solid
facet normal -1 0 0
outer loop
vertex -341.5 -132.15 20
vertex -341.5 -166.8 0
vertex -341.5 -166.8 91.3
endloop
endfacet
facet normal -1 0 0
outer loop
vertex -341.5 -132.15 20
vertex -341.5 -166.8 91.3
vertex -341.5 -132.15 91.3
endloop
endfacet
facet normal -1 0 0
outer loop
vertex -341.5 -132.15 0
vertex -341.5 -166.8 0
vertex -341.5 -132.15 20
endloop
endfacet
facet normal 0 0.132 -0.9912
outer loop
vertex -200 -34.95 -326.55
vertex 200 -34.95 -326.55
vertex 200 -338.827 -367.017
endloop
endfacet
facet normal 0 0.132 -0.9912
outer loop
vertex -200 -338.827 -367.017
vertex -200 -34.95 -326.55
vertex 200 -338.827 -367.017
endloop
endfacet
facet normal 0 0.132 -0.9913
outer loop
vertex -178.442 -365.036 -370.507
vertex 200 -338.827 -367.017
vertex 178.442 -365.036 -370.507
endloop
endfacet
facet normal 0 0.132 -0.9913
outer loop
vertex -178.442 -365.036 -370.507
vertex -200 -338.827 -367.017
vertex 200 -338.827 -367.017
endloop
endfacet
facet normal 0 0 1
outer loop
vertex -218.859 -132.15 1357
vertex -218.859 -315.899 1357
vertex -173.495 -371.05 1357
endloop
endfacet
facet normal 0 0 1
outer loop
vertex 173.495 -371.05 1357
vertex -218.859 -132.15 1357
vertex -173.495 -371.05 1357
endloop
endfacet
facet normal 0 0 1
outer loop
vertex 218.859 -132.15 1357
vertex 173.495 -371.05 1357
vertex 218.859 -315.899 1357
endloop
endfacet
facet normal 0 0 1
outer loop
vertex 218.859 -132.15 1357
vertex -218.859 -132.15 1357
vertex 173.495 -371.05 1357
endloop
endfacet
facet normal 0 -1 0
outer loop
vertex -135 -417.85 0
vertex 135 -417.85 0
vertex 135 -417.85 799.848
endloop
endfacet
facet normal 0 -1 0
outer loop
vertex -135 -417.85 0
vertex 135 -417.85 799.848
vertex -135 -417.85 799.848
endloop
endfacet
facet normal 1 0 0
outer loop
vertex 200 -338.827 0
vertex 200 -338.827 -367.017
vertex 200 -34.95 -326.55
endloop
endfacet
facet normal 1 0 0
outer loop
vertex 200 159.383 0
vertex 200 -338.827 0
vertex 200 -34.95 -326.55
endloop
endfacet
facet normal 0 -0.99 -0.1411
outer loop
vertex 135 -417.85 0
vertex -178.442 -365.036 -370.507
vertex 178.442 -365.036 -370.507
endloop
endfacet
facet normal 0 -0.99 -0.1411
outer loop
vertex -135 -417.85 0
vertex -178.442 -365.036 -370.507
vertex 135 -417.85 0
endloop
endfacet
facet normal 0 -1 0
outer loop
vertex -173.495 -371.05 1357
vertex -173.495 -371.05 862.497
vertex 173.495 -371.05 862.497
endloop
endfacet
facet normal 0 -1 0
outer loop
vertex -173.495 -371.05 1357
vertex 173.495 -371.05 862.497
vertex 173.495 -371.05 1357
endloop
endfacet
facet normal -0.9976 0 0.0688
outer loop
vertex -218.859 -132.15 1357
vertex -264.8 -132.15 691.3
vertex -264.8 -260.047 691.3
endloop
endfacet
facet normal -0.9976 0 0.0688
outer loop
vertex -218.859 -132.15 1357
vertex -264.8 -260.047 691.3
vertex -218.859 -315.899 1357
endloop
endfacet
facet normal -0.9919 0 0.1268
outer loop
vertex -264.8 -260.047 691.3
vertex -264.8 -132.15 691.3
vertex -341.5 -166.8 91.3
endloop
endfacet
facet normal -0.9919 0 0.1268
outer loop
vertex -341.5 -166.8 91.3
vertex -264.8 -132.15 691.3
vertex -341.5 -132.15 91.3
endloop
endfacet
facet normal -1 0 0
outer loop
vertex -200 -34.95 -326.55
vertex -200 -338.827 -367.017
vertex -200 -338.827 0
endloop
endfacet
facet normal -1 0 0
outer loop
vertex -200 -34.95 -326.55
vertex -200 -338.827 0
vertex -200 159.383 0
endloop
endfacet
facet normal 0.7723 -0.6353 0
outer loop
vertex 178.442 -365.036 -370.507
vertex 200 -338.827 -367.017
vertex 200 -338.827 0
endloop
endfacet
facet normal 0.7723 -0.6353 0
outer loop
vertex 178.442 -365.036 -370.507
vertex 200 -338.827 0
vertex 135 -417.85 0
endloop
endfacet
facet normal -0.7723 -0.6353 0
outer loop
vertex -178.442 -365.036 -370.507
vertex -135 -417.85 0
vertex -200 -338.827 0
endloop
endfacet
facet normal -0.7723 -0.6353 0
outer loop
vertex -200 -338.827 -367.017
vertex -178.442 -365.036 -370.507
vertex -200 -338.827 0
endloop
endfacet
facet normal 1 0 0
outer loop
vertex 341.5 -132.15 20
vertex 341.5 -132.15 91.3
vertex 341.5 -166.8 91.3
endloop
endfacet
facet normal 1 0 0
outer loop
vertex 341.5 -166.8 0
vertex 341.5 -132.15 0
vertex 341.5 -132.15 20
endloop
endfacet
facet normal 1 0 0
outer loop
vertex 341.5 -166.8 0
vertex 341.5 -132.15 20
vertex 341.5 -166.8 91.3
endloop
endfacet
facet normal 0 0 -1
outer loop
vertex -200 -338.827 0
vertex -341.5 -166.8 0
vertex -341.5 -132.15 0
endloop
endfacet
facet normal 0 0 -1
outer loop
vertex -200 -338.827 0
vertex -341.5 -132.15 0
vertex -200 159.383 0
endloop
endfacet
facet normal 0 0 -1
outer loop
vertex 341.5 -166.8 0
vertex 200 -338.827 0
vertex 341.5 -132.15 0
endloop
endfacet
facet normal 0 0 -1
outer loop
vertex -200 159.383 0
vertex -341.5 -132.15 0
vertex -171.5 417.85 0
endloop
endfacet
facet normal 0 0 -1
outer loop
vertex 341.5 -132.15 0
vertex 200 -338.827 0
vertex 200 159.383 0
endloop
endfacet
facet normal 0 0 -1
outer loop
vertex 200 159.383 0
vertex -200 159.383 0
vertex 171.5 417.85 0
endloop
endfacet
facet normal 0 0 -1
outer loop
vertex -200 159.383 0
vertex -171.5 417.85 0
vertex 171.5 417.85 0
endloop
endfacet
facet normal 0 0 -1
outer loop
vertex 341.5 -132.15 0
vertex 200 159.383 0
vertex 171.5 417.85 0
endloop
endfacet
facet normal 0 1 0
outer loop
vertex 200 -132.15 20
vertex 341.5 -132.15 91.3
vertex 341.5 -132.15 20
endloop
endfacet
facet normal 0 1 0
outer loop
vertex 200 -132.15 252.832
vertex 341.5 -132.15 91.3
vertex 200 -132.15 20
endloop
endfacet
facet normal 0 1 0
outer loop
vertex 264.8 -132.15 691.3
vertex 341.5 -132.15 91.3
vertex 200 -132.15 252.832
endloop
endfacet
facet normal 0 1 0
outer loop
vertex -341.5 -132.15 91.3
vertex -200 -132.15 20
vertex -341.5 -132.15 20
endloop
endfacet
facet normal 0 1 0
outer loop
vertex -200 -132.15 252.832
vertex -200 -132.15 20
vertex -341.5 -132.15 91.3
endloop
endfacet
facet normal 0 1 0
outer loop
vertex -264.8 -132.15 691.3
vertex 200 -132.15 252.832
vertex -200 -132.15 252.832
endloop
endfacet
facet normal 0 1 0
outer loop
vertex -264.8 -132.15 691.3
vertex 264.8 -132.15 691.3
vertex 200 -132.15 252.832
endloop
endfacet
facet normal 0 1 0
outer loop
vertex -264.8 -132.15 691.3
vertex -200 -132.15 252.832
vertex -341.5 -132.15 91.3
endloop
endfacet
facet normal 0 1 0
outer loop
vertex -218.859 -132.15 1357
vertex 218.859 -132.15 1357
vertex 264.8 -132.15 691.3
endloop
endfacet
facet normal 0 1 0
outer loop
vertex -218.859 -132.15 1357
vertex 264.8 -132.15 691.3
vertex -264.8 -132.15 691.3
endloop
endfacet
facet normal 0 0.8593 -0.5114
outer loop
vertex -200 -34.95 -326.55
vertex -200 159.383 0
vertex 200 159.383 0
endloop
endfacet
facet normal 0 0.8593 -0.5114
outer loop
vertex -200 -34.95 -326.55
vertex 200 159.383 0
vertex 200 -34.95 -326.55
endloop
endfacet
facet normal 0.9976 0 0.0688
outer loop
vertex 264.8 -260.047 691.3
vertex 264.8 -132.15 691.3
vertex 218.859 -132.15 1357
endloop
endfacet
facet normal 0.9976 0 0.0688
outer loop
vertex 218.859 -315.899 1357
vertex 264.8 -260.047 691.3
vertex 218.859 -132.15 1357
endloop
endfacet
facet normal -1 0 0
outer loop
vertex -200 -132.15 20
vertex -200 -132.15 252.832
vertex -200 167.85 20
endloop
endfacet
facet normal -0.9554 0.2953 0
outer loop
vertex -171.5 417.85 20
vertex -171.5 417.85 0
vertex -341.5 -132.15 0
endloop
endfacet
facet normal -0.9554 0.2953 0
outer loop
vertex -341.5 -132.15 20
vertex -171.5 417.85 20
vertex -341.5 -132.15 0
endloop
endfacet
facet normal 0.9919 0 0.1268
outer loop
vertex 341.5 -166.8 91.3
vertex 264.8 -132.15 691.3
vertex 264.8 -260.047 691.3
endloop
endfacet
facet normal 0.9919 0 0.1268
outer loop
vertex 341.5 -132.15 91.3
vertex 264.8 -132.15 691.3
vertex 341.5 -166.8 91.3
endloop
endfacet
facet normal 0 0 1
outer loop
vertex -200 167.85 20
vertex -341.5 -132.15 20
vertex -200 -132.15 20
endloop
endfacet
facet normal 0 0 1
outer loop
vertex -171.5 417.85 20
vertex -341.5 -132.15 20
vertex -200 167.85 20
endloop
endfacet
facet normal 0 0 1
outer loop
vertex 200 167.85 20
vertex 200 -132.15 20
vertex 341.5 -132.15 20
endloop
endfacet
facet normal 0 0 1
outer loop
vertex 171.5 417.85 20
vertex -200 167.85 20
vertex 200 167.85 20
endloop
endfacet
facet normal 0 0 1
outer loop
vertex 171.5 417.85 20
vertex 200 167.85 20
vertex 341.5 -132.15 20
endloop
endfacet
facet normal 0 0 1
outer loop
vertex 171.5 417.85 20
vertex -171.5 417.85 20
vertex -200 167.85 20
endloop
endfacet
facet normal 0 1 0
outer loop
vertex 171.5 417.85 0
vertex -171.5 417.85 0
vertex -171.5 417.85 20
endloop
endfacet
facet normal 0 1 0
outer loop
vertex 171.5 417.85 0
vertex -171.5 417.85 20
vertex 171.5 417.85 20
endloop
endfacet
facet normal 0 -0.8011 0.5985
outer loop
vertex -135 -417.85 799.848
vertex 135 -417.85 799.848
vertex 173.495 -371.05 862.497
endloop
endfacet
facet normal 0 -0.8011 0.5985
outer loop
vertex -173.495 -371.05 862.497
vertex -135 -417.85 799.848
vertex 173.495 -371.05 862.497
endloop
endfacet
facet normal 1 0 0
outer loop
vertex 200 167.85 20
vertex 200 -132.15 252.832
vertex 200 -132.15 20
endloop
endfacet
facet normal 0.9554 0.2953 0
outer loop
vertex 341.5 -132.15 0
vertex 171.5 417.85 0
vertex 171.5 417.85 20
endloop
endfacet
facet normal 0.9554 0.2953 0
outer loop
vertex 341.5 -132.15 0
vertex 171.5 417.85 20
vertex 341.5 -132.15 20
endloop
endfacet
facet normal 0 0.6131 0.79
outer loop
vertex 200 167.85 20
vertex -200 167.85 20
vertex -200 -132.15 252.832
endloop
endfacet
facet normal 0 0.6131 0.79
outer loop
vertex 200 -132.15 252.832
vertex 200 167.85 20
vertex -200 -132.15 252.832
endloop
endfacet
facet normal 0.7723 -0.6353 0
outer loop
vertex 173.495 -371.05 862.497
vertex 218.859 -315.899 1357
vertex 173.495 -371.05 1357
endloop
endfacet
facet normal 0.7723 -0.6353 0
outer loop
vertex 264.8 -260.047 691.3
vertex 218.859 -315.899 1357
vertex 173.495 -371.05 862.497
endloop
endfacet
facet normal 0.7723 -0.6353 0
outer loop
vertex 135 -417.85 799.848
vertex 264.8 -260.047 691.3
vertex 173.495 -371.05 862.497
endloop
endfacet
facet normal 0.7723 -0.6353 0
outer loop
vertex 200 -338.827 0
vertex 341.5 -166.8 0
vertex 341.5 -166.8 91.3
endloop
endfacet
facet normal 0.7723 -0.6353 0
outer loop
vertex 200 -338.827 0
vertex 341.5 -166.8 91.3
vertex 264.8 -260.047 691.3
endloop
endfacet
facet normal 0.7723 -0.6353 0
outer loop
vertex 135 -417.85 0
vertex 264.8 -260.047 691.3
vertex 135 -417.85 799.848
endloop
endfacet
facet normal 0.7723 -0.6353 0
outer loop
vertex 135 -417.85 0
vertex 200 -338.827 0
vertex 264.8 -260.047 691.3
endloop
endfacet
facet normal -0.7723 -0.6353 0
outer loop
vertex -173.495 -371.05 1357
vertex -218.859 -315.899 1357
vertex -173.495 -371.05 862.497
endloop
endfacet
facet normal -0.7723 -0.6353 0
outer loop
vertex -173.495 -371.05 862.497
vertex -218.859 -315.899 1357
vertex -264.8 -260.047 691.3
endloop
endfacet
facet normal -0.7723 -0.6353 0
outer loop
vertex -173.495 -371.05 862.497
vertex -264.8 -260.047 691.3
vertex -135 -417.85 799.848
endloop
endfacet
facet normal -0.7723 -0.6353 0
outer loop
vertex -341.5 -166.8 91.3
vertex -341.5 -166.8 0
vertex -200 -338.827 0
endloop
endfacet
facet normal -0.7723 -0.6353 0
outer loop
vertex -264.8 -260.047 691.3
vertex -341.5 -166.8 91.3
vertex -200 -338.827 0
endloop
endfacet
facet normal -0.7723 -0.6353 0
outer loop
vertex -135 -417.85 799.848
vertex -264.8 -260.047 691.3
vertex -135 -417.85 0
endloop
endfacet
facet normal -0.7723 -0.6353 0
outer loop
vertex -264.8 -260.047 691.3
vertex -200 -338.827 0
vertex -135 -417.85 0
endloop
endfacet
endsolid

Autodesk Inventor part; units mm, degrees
ref_plane "YZ Plane" through (0, 0, 0) normal (1, 0, 0) x (0, 1, 0)
ref_plane "XZ Plane" through (0, 0, 0) normal (0, 1, 0) x (-1, 0, 0)
ref_plane "XY Plane" through (0, 0, 0) normal (0, 0, 1) x (1, 0, 0)
sketch "スケッチ1" plane through (0, 0, 0) normal (0, 0, 1) x (1, 0, 0)
  line L0 (-341.5, 417.85) -> (341.5, 417.85)
  line L1 (341.5, 417.85) -> (341.5, -417.85)
  line L2 (341.5, -417.85) -> (-341.5, -417.85)
  line L3 (-341.5, -417.85) -> (-341.5, 417.85)
  line L4 (-478.1, 0) -> (478.1, 0) projected
  line L5 (0, -584.99) -> (0, 584.99) projected
  point P0 (0, 0)
  point P1 (341.5, 0)
  point P2 (0, 417.85)
  dimension "d2" = 835.7
  dimension "d3" = 683
extrude "押し出し1" add sketch "スケッチ1" along normal blind 1357
sketch "スケッチ3" plane through (0, 0, 0) normal (0, 0, 1) x (1, 0, 0)
  line L0 (-171.5, 417.85) -> (171.5, 417.85)
  line L1 (171.5, 417.85) -> (341.5, -132.15)
  line L2 (341.5, -132.15) -> (341.5, -166.8)
  line L3 (341.5, -166.8) -> (135, -417.85)
  line L4 (-341.5, 417.85) -> (341.5, 417.85) projected
  line L5 (341.5, 417.85) -> (341.5, -417.85) projected
  line L6 (341.5, -417.85) -> (-341.5, -417.85) projected
  line L7 (0, -595.6665) -> (0, 649.0488) projected
  line L8 (135, -417.85) -> (0, -417.85)
  line L9 (-341.5, -417.85) -> (341.5, -417.85) projected
  line L10 (-171.5, 417.85) -> (-341.5, -132.15)
  line L11 (-341.5, -132.15) -> (-341.5, -166.8)
  line L12 (-341.5, -166.8) -> (-135, -417.85)
  line L13 (-135, -417.85) -> (0, -417.85)
  line L14 (341.5, 417.85) -> (-341.5, 417.85) projected
  line L15 (171.5, 417.85) -> (341.5, 417.85)
  line L16 (341.5, 417.85) -> (341.5, -132.15)
  line L17 (341.5, -417.85) -> (341.5, 417.85) projected
  line L18 (341.5, -166.8) -> (341.5, -417.85)
  line L19 (341.5, -417.85) -> (135, -417.85)
  line L20 (-135, -417.85) -> (-341.5, -417.85)
  line L21 (-341.5, -417.85) -> (-341.5, -166.8)
  line L22 (-341.5, 417.85) -> (-341.5, -417.85) projected
  line L23 (-171.5, 417.85) -> (-341.5, 417.85)
  line L24 (-341.5, -132.15) -> (-341.5, 417.85)
  point P0 (0, 0)
  point P1 (0, 417.85)
  dimension "d9" = 343
  dimension "d10" = 34.65
  dimension "d11" = 550
  dimension "d12" = 206.5
extrude "押し出し2" cut sketch "スケッチ3" along normal through all both and the other way through all contours L10 L22 L4 | L4 L5 L1 | L12 L6 L21 | L3 L5 L6
sketch "スケッチ5" plane through (0, 0, 1357) normal (0, 0, 1) x (1, 0, 0)
  line L0 (-171.5, 417.85) -> (-341.5, -132.15) projected
  line L1 (-341.5, -132.15) -> (-171.5, 417.85)
  line L2 (171.5, 417.85) -> (-171.5, 417.85) projected
  line L3 (-171.5, 417.85) -> (171.5, 417.85)
  line L4 (341.5, -132.15) -> (171.5, 417.85) projected
  line L5 (171.5, 417.85) -> (341.5, -132.15)
  line L6 (341.5, -132.15) -> (-341.5, -132.15)
  point P0 (0, 0)
extrude "押し出し3" cut sketch "スケッチ5" against normal blind 1337
sketch "スケッチ6" plane through (-341.5, -132.15, 1357) normal (0, 1, 0) x (1, 0, 0)
  line L0 (0, 1265.7) -> (0, 665.7)
  line L1 (0, 665.7) -> (76.7, 665.7)
  line L2 (76.7, 665.7) -> (0, 1265.7)
  line L3 (0, 1357) -> (170, 1357) projected
  line L4 (0, 0) -> (0, 1337) projected
  line L5 (341.5, 1357) -> (341.5, 1610.7019)
  line L6 (683, 1265.7) -> (683, 665.7)
  line L7 (683, 665.7) -> (606.3, 665.7)
  line L8 (606.3, 665.7) -> (683, 1265.7)
  line L9 (0, 665.7) -> (76.7, 665.7)
  line L10 (0, 665.7) -> (0, 0)
  line L11 (0, 1357) -> (0, 0) projected
  line L12 (76.7, 665.7) -> (122.641, 0)
  line L13 (206.5, 0) -> (206.5, 1357) projected
  line L14 (0, 0) -> (122.641, 0)
  line L15 (683, 0) -> (0, 0) projected
  line L16 (683, 665.7) -> (606.3, 665.7)
  line L17 (683, 665.7) -> (606.3, 665.7)
  line L18 (683, 665.7) -> (683, 0)
  line L19 (606.3, 665.7) -> (560.359, 0)
  line L20 (683, 0) -> (560.359, 0)
  point P0 (683, 0)
  dimension "d17" = 91.3
  dimension "d18" = 600
  dimension "d19" = 76.7
  dimension "d21" = 45.941
extrude "押し出し4" cut sketch "スケッチ6" against normal through all
sketch "スケッチ7" plane through (0, 0, 0) normal (1, 0, 0) x (0, 1, 0)
  line L0 (-315.8994, 1357) -> (-417.85, 1357) projected
  line L1 (-371.05, 1357) -> (-417.85, 1357)
  line L2 (-417.85, 1357) -> (-417.85, 799.8485)
  line L3 (-417.85, 1357) -> (-417.85, 0) projected
  line L4 (-417.85, 799.8485) -> (-371.05, 862.4972)
  line L5 (-371.05, 862.4972) -> (-371.05, 1357)
  line L6 (-315.8994, 1357) -> (-260.0471, 691.3) projected
  line L7 (-417.85, 0) -> (-417.85, 1357) projected
  point P0 (0, 0)
  dimension "d25" = 143.239
  dimension "d26" = 46.8
extrude "押し出し5" cut sketch "スケッチ7" along normal through all both and the other way through all
sketch "スケッチ8" plane through (0, 0, 0) normal (1, 0, 0) x (0, 1, 0)
  line L0 (-132.15, 20) -> (417.85, 20) projected
  line L1 (167.85, 20) -> (-132.15, 252.8315)
  line L2 (-132.15, 91.3) -> (-132.15, 691.3) projected
  line L3 (-132.15, 20) -> (-132.15, 91.3) projected
  line L4 (-132.15, 252.8315) -> (-132.15, 20)
  line L5 (-132.15, 20) -> (167.85, 20)
  point P0 (0, 0)
  dimension "d29" = 37.815
  dimension "d30" = 300
extrude "押し出し6" add sketch "スケッチ8" along normal mid plane 400
sketch "スケッチ9" plane through (0, 0, 0) normal (1, 0, 0) x (0, 1, 0)
  line L0 (159.383, 0) -> (-34.9495, -326.55)
  line L1 (-34.9495, -326.55) -> (-365.0355, -370.5068)
  line L2 (-365.0355, -370.5068) -> (-417.85, 0)
  line L3 (-772.2018, 0) -> (616.192, 0) projected
  line L4 (-417.85, 0) -> (-417.85, 799.8485) projected
  point P0 (0, 0)
  dimension "d33" = 171.887
  dimension "d34" = 128.343
  dimension "d35" = 90.527
  dimension "d36" = 380
  dimension "d37" = 333
extrude "押し出し7" add sketch "スケッチ9" along normal mid plane 400
sketch "スケッチ10" plane through (0, 0, 0) normal (0, 0, 1) x (1, 0, 0)
  line L0 (-200, -338.827) -> (-341.5, -166.8) projected
  line L1 (-200, -365.0355) -> (-200, -417.85) projected
  line L2 (-200, -338.827) -> (-200, -417.85)
  line L3 (-135, -417.85) -> (-200, -417.85) projected
  line L4 (-200, -417.85) -> (-135, -417.85)
  line L5 (-135, -417.85) -> (-200, -338.827)
  line L6 (200, -338.827) -> (200, 159.383) projected
  line L7 (200, -338.827) -> (135, -417.85) projected
  line L8 (200, -338.827) -> (135, -417.85)
  line L9 (200, -417.85) -> (135, -417.85) projected
  line L10 (135, -417.85) -> (200, -417.85)
  line L11 (200, -417.85) -> (200, -338.827)
  point P0 (0, 0)
extrude "押し出し8" cut sketch "スケッチ10" against normal through all
properties part number "newbody"
